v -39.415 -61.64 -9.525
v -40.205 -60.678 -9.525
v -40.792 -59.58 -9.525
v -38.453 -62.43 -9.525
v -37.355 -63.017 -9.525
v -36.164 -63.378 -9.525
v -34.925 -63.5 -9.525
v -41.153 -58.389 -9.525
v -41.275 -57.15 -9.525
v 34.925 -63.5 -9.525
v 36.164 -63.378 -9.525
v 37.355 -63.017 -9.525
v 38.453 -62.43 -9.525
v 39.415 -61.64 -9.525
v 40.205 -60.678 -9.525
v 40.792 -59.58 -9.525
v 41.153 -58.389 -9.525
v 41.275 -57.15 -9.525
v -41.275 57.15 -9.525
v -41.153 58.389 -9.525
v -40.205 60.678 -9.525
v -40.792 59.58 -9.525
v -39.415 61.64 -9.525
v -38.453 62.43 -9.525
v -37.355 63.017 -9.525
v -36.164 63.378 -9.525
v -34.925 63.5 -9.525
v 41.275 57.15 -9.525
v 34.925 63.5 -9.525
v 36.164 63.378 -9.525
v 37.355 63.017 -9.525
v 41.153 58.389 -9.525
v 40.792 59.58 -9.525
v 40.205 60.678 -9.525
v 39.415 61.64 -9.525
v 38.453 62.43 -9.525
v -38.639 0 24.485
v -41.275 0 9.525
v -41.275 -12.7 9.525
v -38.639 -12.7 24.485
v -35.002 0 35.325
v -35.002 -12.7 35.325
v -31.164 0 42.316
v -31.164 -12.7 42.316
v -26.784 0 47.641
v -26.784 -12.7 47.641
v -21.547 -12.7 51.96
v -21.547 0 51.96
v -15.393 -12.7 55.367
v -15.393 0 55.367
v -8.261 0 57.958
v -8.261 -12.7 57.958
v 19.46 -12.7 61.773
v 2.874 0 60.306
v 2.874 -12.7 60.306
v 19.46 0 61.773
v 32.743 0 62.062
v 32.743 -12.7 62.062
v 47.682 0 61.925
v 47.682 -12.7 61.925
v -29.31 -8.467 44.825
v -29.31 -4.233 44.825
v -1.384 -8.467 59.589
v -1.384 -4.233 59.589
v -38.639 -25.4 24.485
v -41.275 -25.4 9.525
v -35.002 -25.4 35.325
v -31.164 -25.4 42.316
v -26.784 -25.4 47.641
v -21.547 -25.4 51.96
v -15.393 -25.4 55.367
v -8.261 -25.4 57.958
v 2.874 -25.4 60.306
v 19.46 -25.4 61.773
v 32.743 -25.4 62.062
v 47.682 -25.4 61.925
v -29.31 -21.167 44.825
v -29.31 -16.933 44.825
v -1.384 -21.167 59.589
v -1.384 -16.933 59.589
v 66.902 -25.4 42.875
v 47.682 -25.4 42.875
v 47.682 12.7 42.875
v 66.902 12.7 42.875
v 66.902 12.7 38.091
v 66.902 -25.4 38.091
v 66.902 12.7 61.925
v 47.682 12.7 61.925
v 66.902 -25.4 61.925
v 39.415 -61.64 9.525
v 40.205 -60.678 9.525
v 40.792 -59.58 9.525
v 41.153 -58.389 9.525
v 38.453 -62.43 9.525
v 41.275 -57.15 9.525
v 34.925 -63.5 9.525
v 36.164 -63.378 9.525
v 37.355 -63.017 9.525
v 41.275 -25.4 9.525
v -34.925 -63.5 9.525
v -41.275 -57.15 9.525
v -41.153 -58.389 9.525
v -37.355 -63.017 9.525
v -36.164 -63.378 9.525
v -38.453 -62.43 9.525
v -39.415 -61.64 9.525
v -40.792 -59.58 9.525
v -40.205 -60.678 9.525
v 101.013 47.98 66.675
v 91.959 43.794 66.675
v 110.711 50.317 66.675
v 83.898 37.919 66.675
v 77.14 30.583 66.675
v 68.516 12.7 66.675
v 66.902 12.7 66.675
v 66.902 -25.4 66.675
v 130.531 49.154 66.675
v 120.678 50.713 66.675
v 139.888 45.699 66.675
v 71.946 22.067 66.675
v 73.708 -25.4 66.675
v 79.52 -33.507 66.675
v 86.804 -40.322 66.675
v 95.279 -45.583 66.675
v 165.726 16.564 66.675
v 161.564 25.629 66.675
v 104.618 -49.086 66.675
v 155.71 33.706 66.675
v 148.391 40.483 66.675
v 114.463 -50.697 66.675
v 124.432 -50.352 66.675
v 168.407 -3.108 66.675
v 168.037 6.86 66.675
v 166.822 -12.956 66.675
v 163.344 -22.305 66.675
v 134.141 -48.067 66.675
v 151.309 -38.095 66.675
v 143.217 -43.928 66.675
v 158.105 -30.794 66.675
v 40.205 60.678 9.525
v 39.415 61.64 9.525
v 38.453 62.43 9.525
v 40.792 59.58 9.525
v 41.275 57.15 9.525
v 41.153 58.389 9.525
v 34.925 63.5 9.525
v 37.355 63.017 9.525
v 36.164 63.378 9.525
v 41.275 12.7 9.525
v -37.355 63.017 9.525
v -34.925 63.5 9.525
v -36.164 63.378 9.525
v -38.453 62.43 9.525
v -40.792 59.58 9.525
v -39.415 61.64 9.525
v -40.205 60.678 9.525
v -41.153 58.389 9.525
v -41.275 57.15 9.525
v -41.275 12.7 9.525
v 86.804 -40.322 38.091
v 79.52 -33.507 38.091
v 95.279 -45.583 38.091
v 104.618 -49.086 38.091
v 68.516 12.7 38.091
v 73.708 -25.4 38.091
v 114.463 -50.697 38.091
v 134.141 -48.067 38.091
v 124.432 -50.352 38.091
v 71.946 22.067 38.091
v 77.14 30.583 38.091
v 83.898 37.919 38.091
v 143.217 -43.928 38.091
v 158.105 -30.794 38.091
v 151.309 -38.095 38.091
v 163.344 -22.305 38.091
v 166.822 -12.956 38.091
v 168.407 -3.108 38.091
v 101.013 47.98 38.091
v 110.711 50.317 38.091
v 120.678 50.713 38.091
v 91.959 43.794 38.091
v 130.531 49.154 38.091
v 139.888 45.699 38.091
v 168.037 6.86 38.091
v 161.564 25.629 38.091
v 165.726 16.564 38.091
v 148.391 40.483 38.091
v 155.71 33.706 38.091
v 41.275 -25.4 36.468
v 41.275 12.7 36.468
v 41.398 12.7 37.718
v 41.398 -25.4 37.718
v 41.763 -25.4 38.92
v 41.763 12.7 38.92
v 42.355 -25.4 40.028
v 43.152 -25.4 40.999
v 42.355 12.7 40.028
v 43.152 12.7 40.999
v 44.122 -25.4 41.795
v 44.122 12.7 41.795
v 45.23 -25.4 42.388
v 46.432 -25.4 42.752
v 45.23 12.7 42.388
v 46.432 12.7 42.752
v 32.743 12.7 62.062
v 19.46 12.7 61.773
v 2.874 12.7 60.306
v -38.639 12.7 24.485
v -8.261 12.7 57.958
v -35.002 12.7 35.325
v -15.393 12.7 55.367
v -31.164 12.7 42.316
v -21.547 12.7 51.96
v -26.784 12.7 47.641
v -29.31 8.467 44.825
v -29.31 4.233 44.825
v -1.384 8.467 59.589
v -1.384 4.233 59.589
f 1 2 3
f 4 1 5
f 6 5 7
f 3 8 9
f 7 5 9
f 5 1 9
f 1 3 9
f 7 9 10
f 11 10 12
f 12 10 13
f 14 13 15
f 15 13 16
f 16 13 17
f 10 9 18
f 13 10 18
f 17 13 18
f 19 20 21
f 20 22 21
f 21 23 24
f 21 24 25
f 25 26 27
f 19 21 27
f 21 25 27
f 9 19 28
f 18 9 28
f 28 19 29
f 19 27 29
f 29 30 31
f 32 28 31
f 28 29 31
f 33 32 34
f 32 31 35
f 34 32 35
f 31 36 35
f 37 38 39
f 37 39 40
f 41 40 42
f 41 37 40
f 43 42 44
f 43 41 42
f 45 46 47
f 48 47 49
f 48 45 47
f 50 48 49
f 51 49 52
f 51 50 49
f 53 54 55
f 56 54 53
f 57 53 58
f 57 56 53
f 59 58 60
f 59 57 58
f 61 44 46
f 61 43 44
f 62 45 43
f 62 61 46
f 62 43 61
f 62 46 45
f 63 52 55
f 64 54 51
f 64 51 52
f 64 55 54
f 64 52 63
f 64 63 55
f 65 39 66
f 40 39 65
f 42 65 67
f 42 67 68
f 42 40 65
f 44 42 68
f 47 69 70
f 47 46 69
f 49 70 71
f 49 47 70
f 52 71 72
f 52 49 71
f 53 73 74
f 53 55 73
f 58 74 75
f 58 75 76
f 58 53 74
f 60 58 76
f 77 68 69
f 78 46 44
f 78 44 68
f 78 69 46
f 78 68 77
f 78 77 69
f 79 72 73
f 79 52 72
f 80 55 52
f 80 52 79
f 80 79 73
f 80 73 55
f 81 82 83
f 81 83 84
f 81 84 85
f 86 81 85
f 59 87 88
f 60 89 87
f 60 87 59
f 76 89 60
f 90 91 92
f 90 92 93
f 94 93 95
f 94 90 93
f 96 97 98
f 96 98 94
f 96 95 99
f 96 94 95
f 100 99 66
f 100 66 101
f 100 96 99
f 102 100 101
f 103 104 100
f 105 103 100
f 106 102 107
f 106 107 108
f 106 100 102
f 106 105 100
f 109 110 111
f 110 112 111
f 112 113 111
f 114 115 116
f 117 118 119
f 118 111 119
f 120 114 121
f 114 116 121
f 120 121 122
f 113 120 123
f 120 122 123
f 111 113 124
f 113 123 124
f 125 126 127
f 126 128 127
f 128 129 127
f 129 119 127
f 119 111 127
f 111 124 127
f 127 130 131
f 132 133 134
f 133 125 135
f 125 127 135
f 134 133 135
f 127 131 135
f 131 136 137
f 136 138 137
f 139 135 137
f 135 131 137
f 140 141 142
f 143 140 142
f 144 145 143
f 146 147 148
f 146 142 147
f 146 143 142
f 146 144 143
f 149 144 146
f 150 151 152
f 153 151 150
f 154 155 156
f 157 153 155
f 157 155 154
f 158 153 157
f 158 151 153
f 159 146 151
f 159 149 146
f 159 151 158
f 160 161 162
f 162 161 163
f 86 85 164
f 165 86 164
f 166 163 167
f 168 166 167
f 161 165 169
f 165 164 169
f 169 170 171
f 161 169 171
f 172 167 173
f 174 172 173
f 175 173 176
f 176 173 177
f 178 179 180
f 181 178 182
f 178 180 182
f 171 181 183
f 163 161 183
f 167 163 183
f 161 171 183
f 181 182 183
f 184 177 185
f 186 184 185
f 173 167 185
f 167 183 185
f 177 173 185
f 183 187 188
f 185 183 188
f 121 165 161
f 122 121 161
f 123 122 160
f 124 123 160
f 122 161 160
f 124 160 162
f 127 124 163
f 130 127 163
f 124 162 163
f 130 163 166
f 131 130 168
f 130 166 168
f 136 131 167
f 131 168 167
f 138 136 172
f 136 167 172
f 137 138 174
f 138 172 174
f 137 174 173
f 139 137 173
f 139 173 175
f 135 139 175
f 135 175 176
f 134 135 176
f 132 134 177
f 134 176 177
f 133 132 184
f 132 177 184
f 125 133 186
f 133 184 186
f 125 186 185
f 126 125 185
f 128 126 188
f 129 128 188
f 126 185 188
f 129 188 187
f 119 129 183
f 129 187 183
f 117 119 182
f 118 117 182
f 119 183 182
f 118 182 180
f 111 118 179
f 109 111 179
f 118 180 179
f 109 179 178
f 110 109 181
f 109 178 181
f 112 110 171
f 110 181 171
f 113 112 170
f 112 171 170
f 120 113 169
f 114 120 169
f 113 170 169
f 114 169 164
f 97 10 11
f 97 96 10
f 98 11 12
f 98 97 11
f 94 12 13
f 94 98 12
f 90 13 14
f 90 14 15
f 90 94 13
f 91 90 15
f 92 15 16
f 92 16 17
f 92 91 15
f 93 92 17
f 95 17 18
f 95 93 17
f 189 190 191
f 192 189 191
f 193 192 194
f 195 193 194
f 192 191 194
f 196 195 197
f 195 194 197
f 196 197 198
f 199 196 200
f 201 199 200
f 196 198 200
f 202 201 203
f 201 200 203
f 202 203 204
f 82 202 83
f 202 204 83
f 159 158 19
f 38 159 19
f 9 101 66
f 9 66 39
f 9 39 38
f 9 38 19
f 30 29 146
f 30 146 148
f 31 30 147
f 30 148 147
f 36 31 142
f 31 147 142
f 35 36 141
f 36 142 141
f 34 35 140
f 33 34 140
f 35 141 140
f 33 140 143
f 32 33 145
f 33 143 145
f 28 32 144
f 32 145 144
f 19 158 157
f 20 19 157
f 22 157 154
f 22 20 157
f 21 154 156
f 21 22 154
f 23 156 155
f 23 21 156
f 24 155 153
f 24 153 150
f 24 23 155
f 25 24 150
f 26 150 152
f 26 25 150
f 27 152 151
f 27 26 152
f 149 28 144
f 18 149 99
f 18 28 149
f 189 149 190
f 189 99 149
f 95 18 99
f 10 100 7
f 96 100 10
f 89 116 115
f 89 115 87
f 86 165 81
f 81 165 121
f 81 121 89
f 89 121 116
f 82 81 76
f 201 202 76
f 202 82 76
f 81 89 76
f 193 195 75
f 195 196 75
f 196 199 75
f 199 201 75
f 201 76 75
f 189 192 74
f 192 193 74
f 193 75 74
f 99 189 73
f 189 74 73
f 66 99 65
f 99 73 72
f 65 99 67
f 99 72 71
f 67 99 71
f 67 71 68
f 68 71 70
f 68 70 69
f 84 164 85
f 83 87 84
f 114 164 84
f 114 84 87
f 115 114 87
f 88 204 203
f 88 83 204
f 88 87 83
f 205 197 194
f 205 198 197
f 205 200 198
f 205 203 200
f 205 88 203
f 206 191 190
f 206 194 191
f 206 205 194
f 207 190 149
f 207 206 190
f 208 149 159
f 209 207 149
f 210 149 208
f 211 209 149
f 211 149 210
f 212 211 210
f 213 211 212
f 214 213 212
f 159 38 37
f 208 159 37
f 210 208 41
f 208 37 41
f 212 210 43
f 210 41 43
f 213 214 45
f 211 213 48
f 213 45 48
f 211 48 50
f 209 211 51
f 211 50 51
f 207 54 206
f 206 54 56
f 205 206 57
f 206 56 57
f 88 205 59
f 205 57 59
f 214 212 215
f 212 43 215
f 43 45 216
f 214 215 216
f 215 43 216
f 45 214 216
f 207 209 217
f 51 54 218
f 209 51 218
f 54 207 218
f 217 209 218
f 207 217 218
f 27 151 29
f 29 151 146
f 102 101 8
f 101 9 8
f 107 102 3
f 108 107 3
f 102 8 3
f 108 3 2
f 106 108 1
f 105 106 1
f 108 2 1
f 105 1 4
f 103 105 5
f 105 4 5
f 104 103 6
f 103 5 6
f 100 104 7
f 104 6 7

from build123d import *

# Parameters (mm, degrees)
F1_DEPTH = 12.7
F2_DEPTH = 63.5
F3_DEPTH = 25.4
F5_R     = 6.35


with BuildPart() as f1:
    # F0 (on Front) → F1 (new body, symmetric)
    with BuildSketch(Plane.XZ):
        with BuildLine():
            add(Edge.make_bspline(
                [(-41.275, 9.525), (-35.564307, 57.795133), (-13.679589, 63.100524), (47.681865, 61.9252)],
                knots=[0, 0, 0, 0, 103.242941, 103.242941, 103.242941, 103.242941], degree=3))
            Line((-41.275, 9.525), (22.225, 9.525))
            Line((22.225, 9.525), (22.225, 36.468335))
            ThreePointArc((22.225, 36.468335), (29.681143, 54.469057), (47.681865, 61.9252))
        make_face()
        Polygon((22.225, 9.525), (-41.275, 9.525), (-41.275, -9.525), (41.275, -9.525), (41.275, 9.525), align=None)
        with BuildLine():
            Line((22.225, 36.468335), (22.225, 9.525))
            Line((22.225, 9.525), (41.275, 9.525))
            Line((41.275, 9.525), (41.275, 36.468335))
            ThreePointArc((41.275, 36.468335), (43.151527, 40.998673), (47.681865, 42.8752))
            Line((47.681865, 42.8752), (66.902457, 42.8752))
            Line((66.902457, 42.8752), (66.902457, 61.9252))
            Line((66.902457, 61.9252), (47.681865, 61.9252))
            ThreePointArc((47.681865, 61.9252), (29.681143, 54.469057), (22.225, 36.468335))
        make_face()
        Polygon((66.902457, 66.675), (66.902457, 61.9252), (66.902457, 42.8752), (66.902457, 38.090521), (117.702457, 38.090521), (117.702457, 66.675), align=None)
    extrude(amount=F1_DEPTH, both=True)

    # F0 (on Front) → F2 (join, symmetric)
    with BuildSketch(Plane.XZ):
        Polygon((22.225, 9.525), (-41.275, 9.525), (-41.275, -9.525), (41.275, -9.525), (41.275, 9.525), align=None)
    extrude(amount=F2_DEPTH, both=True)

    # F0 (on Front) → F3 (join)
    with BuildSketch(Plane.XZ):
        with BuildLine():
            add(Edge.make_bspline(
                [(-41.275, 9.525), (-35.564307, 57.795133), (-13.679589, 63.100524), (47.681865, 61.9252)],
                knots=[0, 0, 0, 0, 103.242941, 103.242941, 103.242941, 103.242941], degree=3))
            Line((-41.275, 9.525), (22.225, 9.525))
            Line((22.225, 9.525), (22.225, 36.468335))
            ThreePointArc((22.225, 36.468335), (29.681143, 54.469057), (47.681865, 61.9252))
        make_face()
        Polygon((22.225, 9.525), (-41.275, 9.525), (-41.275, -9.525), (41.275, -9.525), (41.275, 9.525), align=None)
        with BuildLine():
            Line((22.225, 36.468335), (22.225, 9.525))
            Line((22.225, 9.525), (41.275, 9.525))
            Line((41.275, 9.525), (41.275, 36.468335))
            ThreePointArc((41.275, 36.468335), (43.151527, 40.998673), (47.681865, 42.8752))
            Line((47.681865, 42.8752), (66.902457, 42.8752))
            Line((66.902457, 42.8752), (66.902457, 61.9252))
            Line((66.902457, 61.9252), (47.681865, 61.9252))
            ThreePointArc((47.681865, 61.9252), (29.681143, 54.469057), (22.225, 36.468335))
        make_face()
        Polygon((66.902457, 66.675), (66.902457, 61.9252), (66.902457, 42.8752), (66.902457, 38.090521), (117.702457, 38.090521), (117.702457, 66.675), align=None)
    extrude(amount=F3_DEPTH)

    # F0 (on Front) → F4 (revolve)
    with BuildSketch(Plane.XZ):
        Polygon((66.902457, 66.675), (66.902457, 61.9252), (66.902457, 42.8752), (66.902457, 38.090521), (117.702457, 38.090521), (117.702457, 66.675), align=None)
    revolve(axis=Axis((117.702457, 0, 52.382761), (0, 0, 1)))

    # F5
    f5_edges = [f1.edges().sort_by_distance(p)[0] for p in [
        (-41.275, -63.5, 0),
        (41.275, -63.5, 0),
        (-41.275, 63.5, 0),
        (41.275, 63.5, 0),
    ]]
    fillet(f5_edges, radius=F5_R)


solid = f1.part
